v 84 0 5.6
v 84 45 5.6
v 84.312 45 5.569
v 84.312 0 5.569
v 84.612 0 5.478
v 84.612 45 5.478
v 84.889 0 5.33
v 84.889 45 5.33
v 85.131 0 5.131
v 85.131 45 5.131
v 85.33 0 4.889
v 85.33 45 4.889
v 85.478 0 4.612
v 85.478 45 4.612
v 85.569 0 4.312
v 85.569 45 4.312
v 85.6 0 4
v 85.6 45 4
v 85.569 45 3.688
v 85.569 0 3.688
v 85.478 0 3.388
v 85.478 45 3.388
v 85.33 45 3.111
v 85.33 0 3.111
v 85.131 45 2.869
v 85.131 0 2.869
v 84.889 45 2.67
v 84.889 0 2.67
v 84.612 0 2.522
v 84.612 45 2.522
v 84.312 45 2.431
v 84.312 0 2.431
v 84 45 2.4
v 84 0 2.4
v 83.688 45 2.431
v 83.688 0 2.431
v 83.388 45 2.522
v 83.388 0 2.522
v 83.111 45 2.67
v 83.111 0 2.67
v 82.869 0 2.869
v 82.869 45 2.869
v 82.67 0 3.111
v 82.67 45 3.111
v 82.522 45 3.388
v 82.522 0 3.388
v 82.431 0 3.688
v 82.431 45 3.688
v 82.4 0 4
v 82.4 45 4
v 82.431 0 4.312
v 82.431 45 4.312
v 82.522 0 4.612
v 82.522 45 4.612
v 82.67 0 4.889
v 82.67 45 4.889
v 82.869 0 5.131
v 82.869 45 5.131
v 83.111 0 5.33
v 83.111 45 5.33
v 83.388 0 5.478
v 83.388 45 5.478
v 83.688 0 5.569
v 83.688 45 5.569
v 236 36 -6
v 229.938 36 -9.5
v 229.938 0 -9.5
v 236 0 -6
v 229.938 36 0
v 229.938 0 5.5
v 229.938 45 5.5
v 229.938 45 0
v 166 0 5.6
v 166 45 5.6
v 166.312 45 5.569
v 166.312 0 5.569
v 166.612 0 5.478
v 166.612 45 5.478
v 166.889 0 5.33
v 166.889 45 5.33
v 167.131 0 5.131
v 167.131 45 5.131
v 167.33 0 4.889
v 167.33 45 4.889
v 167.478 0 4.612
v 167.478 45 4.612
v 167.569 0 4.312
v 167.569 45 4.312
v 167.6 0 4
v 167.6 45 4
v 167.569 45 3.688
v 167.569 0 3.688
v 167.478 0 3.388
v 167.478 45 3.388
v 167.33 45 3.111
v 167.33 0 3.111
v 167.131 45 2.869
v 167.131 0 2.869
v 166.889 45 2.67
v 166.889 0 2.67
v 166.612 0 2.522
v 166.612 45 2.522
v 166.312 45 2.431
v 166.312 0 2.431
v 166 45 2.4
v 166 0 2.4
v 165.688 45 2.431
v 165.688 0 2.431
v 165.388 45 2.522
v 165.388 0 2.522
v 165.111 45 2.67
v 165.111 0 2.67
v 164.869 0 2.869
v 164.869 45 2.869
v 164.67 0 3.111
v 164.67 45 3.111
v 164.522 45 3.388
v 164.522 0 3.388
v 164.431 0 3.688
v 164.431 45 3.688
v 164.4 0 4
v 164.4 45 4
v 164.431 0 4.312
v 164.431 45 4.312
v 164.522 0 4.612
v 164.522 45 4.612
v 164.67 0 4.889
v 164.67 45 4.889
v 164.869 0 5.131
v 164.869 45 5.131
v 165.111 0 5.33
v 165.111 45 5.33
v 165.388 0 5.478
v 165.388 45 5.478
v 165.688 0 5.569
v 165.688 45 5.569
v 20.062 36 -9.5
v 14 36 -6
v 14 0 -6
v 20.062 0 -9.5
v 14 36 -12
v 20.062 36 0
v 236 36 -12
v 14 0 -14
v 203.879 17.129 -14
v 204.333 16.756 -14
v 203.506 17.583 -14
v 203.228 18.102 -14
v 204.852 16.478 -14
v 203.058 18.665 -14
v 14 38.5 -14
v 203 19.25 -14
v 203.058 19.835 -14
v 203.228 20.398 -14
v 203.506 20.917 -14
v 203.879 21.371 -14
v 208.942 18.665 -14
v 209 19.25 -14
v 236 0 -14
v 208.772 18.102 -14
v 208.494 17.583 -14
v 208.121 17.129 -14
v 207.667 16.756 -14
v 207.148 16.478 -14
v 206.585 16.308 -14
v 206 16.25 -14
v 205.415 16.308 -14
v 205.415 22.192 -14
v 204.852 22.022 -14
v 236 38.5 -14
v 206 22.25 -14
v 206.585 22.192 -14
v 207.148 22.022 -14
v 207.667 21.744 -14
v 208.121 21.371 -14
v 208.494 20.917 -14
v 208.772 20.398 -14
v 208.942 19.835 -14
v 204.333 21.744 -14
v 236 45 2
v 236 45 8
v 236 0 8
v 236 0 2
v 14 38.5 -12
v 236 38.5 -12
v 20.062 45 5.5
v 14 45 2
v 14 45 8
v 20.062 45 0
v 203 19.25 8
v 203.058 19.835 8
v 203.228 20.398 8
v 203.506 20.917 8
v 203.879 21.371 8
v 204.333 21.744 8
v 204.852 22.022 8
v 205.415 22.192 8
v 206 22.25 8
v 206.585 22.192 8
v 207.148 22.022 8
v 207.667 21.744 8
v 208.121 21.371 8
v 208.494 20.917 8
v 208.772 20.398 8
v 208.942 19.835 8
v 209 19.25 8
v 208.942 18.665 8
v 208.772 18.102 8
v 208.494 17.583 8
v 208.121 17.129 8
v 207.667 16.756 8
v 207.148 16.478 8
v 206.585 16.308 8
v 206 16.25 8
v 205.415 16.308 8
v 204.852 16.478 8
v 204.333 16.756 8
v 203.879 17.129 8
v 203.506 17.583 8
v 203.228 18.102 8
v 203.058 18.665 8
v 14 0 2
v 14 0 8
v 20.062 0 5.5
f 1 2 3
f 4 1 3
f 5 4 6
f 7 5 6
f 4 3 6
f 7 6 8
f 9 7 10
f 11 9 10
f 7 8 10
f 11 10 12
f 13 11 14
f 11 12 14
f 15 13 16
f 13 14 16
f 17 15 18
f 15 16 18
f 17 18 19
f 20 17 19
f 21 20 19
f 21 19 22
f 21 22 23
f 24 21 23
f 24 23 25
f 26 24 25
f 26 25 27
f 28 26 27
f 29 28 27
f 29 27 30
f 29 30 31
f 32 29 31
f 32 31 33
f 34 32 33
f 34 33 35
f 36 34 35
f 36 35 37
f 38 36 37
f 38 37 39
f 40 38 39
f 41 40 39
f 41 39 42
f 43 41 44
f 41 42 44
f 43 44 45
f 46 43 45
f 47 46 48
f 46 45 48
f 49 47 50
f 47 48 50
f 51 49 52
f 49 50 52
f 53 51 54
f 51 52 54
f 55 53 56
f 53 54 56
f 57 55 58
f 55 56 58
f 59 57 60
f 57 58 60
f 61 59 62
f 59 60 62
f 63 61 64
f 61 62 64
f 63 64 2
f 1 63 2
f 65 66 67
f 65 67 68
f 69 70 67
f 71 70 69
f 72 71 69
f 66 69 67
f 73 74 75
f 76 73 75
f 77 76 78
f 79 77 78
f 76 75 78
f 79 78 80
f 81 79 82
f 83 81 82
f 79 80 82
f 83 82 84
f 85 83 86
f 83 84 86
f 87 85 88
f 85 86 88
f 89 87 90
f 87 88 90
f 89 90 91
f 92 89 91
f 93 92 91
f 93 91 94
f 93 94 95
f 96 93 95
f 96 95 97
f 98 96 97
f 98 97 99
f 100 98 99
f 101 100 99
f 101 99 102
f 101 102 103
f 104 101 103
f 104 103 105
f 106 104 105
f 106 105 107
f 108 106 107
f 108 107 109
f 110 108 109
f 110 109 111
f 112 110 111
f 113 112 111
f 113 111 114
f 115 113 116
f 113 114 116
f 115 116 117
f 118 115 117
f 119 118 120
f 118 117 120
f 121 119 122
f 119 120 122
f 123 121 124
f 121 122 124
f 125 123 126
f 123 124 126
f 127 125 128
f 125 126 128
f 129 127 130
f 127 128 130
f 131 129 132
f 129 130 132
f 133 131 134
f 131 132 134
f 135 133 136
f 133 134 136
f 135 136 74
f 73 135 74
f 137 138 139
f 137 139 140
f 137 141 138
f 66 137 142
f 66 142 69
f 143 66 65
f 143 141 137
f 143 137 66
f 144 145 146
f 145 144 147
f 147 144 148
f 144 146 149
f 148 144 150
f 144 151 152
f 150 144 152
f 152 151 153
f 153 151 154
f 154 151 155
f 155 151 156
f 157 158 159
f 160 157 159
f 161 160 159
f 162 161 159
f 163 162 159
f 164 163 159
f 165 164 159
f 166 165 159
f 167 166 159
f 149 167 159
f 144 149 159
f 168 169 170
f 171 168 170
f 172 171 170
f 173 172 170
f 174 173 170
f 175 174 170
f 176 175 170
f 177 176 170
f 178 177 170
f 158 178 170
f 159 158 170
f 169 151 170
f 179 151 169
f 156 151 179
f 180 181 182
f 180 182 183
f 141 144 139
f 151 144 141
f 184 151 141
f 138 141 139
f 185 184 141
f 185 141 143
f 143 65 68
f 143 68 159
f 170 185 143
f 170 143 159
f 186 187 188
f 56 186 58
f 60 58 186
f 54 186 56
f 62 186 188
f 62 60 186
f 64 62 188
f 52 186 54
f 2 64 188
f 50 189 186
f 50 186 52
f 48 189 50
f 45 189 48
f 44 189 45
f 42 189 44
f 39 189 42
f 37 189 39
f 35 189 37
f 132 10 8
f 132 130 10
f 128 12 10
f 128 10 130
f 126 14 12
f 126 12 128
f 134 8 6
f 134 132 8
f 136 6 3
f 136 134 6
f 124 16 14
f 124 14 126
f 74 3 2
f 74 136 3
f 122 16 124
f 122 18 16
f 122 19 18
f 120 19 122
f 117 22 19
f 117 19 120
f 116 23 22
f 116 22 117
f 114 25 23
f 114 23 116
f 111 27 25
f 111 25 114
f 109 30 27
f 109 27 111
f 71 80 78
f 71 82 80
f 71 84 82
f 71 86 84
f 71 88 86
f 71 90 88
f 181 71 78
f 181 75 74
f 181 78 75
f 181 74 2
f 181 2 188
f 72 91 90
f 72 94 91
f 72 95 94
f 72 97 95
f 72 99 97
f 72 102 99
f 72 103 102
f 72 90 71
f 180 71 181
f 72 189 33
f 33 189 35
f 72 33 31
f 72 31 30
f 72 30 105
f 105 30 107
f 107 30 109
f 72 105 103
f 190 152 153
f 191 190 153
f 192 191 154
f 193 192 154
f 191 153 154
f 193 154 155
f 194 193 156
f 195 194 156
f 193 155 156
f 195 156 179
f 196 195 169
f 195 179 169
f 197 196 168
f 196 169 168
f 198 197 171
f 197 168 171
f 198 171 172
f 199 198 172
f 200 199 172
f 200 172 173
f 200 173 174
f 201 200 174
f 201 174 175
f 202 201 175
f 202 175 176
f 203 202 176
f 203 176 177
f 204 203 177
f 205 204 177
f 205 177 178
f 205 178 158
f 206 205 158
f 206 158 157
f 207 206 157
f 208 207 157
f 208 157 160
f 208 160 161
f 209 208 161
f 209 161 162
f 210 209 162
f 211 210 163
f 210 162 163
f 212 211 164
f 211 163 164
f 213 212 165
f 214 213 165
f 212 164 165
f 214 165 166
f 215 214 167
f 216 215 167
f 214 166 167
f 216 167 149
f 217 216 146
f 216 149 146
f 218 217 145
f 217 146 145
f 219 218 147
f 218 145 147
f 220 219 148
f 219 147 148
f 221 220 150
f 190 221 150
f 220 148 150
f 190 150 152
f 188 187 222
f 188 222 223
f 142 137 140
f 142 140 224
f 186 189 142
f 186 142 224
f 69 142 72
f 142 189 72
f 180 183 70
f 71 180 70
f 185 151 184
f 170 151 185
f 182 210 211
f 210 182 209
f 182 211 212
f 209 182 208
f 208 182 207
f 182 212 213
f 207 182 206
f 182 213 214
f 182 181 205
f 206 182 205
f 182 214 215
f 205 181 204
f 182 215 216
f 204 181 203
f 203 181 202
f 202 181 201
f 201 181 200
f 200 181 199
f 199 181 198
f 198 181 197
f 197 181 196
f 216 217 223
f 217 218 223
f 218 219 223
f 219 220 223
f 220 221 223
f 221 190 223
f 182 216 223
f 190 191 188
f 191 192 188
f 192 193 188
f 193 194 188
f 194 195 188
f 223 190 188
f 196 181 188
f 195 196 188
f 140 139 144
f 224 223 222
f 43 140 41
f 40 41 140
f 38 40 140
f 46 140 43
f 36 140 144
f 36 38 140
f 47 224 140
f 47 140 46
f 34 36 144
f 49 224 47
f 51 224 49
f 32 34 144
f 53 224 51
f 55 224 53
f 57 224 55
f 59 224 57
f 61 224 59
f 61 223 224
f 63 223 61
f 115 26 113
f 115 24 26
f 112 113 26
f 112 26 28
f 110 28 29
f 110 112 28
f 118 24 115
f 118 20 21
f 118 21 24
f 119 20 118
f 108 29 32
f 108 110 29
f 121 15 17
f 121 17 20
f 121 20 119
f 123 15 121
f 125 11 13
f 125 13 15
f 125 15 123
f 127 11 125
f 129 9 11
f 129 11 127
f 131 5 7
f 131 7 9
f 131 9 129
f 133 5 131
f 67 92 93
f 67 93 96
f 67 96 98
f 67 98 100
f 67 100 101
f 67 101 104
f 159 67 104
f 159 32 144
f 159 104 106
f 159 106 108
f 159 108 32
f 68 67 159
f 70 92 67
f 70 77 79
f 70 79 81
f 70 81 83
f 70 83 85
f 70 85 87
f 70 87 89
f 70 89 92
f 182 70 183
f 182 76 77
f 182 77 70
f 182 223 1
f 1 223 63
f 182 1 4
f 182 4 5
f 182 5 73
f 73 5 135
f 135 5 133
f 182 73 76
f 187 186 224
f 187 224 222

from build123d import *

# Parameters (mm, degrees)
SKETCH_1_W           = 270
SKETCH_1_H           = 370
SKETCH_1_W_2         = 250
SKETCH_1_H_2         = 350
EXTRUDE_2_DEPTH      = 45
SKETCH_4_W           = 250
SKETCH_4_H           = 350
SKETCH_4_W_2         = 222
SKETCH_4_H_2         = 322
EXTRUDE_3_DEPTH      = 5
SKETCH_9_W           = 246
SKETCH_9_H           = 346
SKETCH_9_W_2         = 226
SKETCH_9_H_2         = 326
CUT_EXTRUDE_3_DEPTH  = 2.5
SKETCH_12_R          = 1.6
CUT_EXTRUDE_5_DEPTH  = 109.5
FILLET_1_R           = 5
SKETCH_13_W          = 250
SKETCH_13_H          = 350
SKETCH_13_W_2        = 222
SKETCH_13_H_2        = 322
EXTRUDE_4_DEPTH      = 33.5
CUT_EXTRUDE_START    = -126.5
CUT_EXTRUDE_8_DEPTH  = 126.5
SKETCH_15_W          = 209.875644348
SKETCH_15_H          = 2
CUT_EXTRUDE_9_DEPTH  = 2.5
CUT_EXTRUDE_10_DEPTH = 60.5
SKETCH_18_R          = 1.6
CUT_EXTRUDE_11_DEPTH = 60.5
SKETCH_21_R          = 3
CUT_EXTRUDE_14_DEPTH = 40


with BuildPart() as part:
    # 草图1 → 凸台-拉伸2 (new body)
    with BuildSketch(Plane(origin=(0, 0, 0), x_dir=(1, 0, 0), z_dir=(0, 1, 0))):
        with Locations((125, 175)):
            Rectangle(SKETCH_1_W, SKETCH_1_H)
        with Locations((125, 175)):
            Rectangle(SKETCH_1_W_2, SKETCH_1_H_2, mode=Mode.SUBTRACT)
    extrude(amount=EXTRUDE_2_DEPTH)

    # 草图4 → 凸台-拉伸3 (add)
    with BuildSketch(Plane(origin=(0, 38.5, 0), x_dir=(1, 0, 0), z_dir=(0, 1, 0))):
        with Locations((125, 175)):
            Rectangle(SKETCH_4_W, SKETCH_4_H)
        with Locations((125, 175)):
            Rectangle(SKETCH_4_W_2, SKETCH_4_H_2, mode=Mode.SUBTRACT)
    extrude(amount=-EXTRUDE_3_DEPTH)

    # 草图9 → 切除-拉伸3 (cut)
    with BuildSketch(Plane(origin=(0, 38.5, 0), x_dir=(1, 0, 0), z_dir=(0, 1, 0))):
        with Locations((125, 175)):
            Rectangle(SKETCH_9_W, SKETCH_9_H)
        with Locations((125, 175)):
            Rectangle(SKETCH_9_W_2, SKETCH_9_H_2, mode=Mode.SUBTRACT)
    extrude(amount=-CUT_EXTRUDE_3_DEPTH, mode=Mode.SUBTRACT)

    # 草图12 → 切除-拉伸5 (cut)
    with BuildSketch(Plane(origin=(0, 45, 0), x_dir=(1, 0, 0), z_dir=(0, 1, 0))):
        with Locations((-5, 355)):
            Circle(SKETCH_12_R)
        with Locations((-5, -5)):
            Circle(SKETCH_12_R)
        with Locations((255, -5)):
            Circle(SKETCH_12_R)
        with Locations((255, 355)):
            Circle(SKETCH_12_R)
    extrude(amount=-CUT_EXTRUDE_5_DEPTH, mode=Mode.SUBTRACT)

    # 圆角1
    fillet_1_edges = [part.edges().sort_by_distance(p)[0] for p in [
        (260, 22.5, -360),
        (260, 22.5, 10),
        (-10, 22.5, 10),
        (-10, 22.5, -360),
    ]]
    fillet(fillet_1_edges, radius=FILLET_1_R)

    # 草图13 → 凸台-拉伸4 (add)
    with BuildSketch(Plane.XZ.offset(-33.5)):
        with Locations((125, -175)):
            Rectangle(SKETCH_13_W, SKETCH_13_H)
        with Locations((125, -175)):
            Rectangle(SKETCH_13_W_2, SKETCH_13_H_2, mode=Mode.SUBTRACT)
    extrude(amount=EXTRUDE_4_DEPTH)

    # 草图14 → 切除-拉伸8 (cut)
    with BuildSketch(Plane.XZ.offset(CUT_EXTRUDE_START)):
        with BuildLine():
            Line((14, -336), (14, -6))
            Line((14, -6), (20.062177826, -9.5))
            Line((20.062177826, -9.5), (20.062177826, 5.5))
            Line((20.062177826, 5.5), (14, 2))
            Line((14, 2), (14, 10))
            Line((14, 10), (-5, 10))
            ThreePointArc((-5, 10), (-8.535533906, 8.535533906), (-10, 5))
            Line((-10, 5), (-10, -355))
            ThreePointArc((-10, -355), (-8.535533906, -358.535533906), (-5, -360))
            Line((-5, -360), (255, -360))
            ThreePointArc((255, -360), (258.535533906, -358.535533906), (260, -355))
            Line((260, -355), (260, 5))
            ThreePointArc((260, 5), (258.535533906, 8.535533906), (255, 10))
            Line((255, 10), (236, 10))
            Line((236, 10), (236, 2))
            Line((236, 2), (229.937822174, 5.5))
            Line((229.937822174, 5.5), (229.937822174, -9.5))
            Line((229.937822174, -9.5), (236, -6))
            Line((236, -6), (236, -336))
            Line((236, -336), (14, -336))
        make_face()
    extrude(amount=CUT_EXTRUDE_8_DEPTH, mode=Mode.SUBTRACT)

    # 草图15 → 切除-拉伸9 (cut)
    with BuildSketch(Plane(origin=(0, 38.5, 0), x_dir=(1, 0, 0), z_dir=(0, 1, 0))):
        with Locations((125, 1)):
            Rectangle(SKETCH_15_W, SKETCH_15_H)
    extrude(amount=-CUT_EXTRUDE_9_DEPTH, mode=Mode.SUBTRACT)

    # 草图16 → 切除-拉伸10 (cut)
    with BuildSketch(Plane(origin=(0, 45, 0), x_dir=(1, 0, 0), z_dir=(0, 1, 0))):
        Polygon((236, -10), (236, -8), (234, -8), (229.607695155, -8), (14, -8), (14, -10), align=None)
    extrude(amount=-CUT_EXTRUDE_10_DEPTH, mode=Mode.SUBTRACT)

    # 草图18 → 切除-拉伸11 (cut)
    with BuildSketch(Plane(origin=(0, 45, 0), x_dir=(1, 0, 0), z_dir=(0, 1, 0))):
        with Locations((166, -4)):
            Circle(SKETCH_18_R)
        with Locations((84, -4)):
            Circle(SKETCH_18_R)
    extrude(amount=-CUT_EXTRUDE_11_DEPTH, mode=Mode.SUBTRACT)

    # 草图21 → 切除-拉伸14 (cut)
    with BuildSketch(Plane(origin=(0, 0, -14), x_dir=(-1, 0, 0), z_dir=(0, 0, -1))):
        with Locations((-206, 19.25)):
            Circle(SKETCH_21_R)
    extrude(amount=-CUT_EXTRUDE_14_DEPTH, mode=Mode.SUBTRACT)


solid = part.part
